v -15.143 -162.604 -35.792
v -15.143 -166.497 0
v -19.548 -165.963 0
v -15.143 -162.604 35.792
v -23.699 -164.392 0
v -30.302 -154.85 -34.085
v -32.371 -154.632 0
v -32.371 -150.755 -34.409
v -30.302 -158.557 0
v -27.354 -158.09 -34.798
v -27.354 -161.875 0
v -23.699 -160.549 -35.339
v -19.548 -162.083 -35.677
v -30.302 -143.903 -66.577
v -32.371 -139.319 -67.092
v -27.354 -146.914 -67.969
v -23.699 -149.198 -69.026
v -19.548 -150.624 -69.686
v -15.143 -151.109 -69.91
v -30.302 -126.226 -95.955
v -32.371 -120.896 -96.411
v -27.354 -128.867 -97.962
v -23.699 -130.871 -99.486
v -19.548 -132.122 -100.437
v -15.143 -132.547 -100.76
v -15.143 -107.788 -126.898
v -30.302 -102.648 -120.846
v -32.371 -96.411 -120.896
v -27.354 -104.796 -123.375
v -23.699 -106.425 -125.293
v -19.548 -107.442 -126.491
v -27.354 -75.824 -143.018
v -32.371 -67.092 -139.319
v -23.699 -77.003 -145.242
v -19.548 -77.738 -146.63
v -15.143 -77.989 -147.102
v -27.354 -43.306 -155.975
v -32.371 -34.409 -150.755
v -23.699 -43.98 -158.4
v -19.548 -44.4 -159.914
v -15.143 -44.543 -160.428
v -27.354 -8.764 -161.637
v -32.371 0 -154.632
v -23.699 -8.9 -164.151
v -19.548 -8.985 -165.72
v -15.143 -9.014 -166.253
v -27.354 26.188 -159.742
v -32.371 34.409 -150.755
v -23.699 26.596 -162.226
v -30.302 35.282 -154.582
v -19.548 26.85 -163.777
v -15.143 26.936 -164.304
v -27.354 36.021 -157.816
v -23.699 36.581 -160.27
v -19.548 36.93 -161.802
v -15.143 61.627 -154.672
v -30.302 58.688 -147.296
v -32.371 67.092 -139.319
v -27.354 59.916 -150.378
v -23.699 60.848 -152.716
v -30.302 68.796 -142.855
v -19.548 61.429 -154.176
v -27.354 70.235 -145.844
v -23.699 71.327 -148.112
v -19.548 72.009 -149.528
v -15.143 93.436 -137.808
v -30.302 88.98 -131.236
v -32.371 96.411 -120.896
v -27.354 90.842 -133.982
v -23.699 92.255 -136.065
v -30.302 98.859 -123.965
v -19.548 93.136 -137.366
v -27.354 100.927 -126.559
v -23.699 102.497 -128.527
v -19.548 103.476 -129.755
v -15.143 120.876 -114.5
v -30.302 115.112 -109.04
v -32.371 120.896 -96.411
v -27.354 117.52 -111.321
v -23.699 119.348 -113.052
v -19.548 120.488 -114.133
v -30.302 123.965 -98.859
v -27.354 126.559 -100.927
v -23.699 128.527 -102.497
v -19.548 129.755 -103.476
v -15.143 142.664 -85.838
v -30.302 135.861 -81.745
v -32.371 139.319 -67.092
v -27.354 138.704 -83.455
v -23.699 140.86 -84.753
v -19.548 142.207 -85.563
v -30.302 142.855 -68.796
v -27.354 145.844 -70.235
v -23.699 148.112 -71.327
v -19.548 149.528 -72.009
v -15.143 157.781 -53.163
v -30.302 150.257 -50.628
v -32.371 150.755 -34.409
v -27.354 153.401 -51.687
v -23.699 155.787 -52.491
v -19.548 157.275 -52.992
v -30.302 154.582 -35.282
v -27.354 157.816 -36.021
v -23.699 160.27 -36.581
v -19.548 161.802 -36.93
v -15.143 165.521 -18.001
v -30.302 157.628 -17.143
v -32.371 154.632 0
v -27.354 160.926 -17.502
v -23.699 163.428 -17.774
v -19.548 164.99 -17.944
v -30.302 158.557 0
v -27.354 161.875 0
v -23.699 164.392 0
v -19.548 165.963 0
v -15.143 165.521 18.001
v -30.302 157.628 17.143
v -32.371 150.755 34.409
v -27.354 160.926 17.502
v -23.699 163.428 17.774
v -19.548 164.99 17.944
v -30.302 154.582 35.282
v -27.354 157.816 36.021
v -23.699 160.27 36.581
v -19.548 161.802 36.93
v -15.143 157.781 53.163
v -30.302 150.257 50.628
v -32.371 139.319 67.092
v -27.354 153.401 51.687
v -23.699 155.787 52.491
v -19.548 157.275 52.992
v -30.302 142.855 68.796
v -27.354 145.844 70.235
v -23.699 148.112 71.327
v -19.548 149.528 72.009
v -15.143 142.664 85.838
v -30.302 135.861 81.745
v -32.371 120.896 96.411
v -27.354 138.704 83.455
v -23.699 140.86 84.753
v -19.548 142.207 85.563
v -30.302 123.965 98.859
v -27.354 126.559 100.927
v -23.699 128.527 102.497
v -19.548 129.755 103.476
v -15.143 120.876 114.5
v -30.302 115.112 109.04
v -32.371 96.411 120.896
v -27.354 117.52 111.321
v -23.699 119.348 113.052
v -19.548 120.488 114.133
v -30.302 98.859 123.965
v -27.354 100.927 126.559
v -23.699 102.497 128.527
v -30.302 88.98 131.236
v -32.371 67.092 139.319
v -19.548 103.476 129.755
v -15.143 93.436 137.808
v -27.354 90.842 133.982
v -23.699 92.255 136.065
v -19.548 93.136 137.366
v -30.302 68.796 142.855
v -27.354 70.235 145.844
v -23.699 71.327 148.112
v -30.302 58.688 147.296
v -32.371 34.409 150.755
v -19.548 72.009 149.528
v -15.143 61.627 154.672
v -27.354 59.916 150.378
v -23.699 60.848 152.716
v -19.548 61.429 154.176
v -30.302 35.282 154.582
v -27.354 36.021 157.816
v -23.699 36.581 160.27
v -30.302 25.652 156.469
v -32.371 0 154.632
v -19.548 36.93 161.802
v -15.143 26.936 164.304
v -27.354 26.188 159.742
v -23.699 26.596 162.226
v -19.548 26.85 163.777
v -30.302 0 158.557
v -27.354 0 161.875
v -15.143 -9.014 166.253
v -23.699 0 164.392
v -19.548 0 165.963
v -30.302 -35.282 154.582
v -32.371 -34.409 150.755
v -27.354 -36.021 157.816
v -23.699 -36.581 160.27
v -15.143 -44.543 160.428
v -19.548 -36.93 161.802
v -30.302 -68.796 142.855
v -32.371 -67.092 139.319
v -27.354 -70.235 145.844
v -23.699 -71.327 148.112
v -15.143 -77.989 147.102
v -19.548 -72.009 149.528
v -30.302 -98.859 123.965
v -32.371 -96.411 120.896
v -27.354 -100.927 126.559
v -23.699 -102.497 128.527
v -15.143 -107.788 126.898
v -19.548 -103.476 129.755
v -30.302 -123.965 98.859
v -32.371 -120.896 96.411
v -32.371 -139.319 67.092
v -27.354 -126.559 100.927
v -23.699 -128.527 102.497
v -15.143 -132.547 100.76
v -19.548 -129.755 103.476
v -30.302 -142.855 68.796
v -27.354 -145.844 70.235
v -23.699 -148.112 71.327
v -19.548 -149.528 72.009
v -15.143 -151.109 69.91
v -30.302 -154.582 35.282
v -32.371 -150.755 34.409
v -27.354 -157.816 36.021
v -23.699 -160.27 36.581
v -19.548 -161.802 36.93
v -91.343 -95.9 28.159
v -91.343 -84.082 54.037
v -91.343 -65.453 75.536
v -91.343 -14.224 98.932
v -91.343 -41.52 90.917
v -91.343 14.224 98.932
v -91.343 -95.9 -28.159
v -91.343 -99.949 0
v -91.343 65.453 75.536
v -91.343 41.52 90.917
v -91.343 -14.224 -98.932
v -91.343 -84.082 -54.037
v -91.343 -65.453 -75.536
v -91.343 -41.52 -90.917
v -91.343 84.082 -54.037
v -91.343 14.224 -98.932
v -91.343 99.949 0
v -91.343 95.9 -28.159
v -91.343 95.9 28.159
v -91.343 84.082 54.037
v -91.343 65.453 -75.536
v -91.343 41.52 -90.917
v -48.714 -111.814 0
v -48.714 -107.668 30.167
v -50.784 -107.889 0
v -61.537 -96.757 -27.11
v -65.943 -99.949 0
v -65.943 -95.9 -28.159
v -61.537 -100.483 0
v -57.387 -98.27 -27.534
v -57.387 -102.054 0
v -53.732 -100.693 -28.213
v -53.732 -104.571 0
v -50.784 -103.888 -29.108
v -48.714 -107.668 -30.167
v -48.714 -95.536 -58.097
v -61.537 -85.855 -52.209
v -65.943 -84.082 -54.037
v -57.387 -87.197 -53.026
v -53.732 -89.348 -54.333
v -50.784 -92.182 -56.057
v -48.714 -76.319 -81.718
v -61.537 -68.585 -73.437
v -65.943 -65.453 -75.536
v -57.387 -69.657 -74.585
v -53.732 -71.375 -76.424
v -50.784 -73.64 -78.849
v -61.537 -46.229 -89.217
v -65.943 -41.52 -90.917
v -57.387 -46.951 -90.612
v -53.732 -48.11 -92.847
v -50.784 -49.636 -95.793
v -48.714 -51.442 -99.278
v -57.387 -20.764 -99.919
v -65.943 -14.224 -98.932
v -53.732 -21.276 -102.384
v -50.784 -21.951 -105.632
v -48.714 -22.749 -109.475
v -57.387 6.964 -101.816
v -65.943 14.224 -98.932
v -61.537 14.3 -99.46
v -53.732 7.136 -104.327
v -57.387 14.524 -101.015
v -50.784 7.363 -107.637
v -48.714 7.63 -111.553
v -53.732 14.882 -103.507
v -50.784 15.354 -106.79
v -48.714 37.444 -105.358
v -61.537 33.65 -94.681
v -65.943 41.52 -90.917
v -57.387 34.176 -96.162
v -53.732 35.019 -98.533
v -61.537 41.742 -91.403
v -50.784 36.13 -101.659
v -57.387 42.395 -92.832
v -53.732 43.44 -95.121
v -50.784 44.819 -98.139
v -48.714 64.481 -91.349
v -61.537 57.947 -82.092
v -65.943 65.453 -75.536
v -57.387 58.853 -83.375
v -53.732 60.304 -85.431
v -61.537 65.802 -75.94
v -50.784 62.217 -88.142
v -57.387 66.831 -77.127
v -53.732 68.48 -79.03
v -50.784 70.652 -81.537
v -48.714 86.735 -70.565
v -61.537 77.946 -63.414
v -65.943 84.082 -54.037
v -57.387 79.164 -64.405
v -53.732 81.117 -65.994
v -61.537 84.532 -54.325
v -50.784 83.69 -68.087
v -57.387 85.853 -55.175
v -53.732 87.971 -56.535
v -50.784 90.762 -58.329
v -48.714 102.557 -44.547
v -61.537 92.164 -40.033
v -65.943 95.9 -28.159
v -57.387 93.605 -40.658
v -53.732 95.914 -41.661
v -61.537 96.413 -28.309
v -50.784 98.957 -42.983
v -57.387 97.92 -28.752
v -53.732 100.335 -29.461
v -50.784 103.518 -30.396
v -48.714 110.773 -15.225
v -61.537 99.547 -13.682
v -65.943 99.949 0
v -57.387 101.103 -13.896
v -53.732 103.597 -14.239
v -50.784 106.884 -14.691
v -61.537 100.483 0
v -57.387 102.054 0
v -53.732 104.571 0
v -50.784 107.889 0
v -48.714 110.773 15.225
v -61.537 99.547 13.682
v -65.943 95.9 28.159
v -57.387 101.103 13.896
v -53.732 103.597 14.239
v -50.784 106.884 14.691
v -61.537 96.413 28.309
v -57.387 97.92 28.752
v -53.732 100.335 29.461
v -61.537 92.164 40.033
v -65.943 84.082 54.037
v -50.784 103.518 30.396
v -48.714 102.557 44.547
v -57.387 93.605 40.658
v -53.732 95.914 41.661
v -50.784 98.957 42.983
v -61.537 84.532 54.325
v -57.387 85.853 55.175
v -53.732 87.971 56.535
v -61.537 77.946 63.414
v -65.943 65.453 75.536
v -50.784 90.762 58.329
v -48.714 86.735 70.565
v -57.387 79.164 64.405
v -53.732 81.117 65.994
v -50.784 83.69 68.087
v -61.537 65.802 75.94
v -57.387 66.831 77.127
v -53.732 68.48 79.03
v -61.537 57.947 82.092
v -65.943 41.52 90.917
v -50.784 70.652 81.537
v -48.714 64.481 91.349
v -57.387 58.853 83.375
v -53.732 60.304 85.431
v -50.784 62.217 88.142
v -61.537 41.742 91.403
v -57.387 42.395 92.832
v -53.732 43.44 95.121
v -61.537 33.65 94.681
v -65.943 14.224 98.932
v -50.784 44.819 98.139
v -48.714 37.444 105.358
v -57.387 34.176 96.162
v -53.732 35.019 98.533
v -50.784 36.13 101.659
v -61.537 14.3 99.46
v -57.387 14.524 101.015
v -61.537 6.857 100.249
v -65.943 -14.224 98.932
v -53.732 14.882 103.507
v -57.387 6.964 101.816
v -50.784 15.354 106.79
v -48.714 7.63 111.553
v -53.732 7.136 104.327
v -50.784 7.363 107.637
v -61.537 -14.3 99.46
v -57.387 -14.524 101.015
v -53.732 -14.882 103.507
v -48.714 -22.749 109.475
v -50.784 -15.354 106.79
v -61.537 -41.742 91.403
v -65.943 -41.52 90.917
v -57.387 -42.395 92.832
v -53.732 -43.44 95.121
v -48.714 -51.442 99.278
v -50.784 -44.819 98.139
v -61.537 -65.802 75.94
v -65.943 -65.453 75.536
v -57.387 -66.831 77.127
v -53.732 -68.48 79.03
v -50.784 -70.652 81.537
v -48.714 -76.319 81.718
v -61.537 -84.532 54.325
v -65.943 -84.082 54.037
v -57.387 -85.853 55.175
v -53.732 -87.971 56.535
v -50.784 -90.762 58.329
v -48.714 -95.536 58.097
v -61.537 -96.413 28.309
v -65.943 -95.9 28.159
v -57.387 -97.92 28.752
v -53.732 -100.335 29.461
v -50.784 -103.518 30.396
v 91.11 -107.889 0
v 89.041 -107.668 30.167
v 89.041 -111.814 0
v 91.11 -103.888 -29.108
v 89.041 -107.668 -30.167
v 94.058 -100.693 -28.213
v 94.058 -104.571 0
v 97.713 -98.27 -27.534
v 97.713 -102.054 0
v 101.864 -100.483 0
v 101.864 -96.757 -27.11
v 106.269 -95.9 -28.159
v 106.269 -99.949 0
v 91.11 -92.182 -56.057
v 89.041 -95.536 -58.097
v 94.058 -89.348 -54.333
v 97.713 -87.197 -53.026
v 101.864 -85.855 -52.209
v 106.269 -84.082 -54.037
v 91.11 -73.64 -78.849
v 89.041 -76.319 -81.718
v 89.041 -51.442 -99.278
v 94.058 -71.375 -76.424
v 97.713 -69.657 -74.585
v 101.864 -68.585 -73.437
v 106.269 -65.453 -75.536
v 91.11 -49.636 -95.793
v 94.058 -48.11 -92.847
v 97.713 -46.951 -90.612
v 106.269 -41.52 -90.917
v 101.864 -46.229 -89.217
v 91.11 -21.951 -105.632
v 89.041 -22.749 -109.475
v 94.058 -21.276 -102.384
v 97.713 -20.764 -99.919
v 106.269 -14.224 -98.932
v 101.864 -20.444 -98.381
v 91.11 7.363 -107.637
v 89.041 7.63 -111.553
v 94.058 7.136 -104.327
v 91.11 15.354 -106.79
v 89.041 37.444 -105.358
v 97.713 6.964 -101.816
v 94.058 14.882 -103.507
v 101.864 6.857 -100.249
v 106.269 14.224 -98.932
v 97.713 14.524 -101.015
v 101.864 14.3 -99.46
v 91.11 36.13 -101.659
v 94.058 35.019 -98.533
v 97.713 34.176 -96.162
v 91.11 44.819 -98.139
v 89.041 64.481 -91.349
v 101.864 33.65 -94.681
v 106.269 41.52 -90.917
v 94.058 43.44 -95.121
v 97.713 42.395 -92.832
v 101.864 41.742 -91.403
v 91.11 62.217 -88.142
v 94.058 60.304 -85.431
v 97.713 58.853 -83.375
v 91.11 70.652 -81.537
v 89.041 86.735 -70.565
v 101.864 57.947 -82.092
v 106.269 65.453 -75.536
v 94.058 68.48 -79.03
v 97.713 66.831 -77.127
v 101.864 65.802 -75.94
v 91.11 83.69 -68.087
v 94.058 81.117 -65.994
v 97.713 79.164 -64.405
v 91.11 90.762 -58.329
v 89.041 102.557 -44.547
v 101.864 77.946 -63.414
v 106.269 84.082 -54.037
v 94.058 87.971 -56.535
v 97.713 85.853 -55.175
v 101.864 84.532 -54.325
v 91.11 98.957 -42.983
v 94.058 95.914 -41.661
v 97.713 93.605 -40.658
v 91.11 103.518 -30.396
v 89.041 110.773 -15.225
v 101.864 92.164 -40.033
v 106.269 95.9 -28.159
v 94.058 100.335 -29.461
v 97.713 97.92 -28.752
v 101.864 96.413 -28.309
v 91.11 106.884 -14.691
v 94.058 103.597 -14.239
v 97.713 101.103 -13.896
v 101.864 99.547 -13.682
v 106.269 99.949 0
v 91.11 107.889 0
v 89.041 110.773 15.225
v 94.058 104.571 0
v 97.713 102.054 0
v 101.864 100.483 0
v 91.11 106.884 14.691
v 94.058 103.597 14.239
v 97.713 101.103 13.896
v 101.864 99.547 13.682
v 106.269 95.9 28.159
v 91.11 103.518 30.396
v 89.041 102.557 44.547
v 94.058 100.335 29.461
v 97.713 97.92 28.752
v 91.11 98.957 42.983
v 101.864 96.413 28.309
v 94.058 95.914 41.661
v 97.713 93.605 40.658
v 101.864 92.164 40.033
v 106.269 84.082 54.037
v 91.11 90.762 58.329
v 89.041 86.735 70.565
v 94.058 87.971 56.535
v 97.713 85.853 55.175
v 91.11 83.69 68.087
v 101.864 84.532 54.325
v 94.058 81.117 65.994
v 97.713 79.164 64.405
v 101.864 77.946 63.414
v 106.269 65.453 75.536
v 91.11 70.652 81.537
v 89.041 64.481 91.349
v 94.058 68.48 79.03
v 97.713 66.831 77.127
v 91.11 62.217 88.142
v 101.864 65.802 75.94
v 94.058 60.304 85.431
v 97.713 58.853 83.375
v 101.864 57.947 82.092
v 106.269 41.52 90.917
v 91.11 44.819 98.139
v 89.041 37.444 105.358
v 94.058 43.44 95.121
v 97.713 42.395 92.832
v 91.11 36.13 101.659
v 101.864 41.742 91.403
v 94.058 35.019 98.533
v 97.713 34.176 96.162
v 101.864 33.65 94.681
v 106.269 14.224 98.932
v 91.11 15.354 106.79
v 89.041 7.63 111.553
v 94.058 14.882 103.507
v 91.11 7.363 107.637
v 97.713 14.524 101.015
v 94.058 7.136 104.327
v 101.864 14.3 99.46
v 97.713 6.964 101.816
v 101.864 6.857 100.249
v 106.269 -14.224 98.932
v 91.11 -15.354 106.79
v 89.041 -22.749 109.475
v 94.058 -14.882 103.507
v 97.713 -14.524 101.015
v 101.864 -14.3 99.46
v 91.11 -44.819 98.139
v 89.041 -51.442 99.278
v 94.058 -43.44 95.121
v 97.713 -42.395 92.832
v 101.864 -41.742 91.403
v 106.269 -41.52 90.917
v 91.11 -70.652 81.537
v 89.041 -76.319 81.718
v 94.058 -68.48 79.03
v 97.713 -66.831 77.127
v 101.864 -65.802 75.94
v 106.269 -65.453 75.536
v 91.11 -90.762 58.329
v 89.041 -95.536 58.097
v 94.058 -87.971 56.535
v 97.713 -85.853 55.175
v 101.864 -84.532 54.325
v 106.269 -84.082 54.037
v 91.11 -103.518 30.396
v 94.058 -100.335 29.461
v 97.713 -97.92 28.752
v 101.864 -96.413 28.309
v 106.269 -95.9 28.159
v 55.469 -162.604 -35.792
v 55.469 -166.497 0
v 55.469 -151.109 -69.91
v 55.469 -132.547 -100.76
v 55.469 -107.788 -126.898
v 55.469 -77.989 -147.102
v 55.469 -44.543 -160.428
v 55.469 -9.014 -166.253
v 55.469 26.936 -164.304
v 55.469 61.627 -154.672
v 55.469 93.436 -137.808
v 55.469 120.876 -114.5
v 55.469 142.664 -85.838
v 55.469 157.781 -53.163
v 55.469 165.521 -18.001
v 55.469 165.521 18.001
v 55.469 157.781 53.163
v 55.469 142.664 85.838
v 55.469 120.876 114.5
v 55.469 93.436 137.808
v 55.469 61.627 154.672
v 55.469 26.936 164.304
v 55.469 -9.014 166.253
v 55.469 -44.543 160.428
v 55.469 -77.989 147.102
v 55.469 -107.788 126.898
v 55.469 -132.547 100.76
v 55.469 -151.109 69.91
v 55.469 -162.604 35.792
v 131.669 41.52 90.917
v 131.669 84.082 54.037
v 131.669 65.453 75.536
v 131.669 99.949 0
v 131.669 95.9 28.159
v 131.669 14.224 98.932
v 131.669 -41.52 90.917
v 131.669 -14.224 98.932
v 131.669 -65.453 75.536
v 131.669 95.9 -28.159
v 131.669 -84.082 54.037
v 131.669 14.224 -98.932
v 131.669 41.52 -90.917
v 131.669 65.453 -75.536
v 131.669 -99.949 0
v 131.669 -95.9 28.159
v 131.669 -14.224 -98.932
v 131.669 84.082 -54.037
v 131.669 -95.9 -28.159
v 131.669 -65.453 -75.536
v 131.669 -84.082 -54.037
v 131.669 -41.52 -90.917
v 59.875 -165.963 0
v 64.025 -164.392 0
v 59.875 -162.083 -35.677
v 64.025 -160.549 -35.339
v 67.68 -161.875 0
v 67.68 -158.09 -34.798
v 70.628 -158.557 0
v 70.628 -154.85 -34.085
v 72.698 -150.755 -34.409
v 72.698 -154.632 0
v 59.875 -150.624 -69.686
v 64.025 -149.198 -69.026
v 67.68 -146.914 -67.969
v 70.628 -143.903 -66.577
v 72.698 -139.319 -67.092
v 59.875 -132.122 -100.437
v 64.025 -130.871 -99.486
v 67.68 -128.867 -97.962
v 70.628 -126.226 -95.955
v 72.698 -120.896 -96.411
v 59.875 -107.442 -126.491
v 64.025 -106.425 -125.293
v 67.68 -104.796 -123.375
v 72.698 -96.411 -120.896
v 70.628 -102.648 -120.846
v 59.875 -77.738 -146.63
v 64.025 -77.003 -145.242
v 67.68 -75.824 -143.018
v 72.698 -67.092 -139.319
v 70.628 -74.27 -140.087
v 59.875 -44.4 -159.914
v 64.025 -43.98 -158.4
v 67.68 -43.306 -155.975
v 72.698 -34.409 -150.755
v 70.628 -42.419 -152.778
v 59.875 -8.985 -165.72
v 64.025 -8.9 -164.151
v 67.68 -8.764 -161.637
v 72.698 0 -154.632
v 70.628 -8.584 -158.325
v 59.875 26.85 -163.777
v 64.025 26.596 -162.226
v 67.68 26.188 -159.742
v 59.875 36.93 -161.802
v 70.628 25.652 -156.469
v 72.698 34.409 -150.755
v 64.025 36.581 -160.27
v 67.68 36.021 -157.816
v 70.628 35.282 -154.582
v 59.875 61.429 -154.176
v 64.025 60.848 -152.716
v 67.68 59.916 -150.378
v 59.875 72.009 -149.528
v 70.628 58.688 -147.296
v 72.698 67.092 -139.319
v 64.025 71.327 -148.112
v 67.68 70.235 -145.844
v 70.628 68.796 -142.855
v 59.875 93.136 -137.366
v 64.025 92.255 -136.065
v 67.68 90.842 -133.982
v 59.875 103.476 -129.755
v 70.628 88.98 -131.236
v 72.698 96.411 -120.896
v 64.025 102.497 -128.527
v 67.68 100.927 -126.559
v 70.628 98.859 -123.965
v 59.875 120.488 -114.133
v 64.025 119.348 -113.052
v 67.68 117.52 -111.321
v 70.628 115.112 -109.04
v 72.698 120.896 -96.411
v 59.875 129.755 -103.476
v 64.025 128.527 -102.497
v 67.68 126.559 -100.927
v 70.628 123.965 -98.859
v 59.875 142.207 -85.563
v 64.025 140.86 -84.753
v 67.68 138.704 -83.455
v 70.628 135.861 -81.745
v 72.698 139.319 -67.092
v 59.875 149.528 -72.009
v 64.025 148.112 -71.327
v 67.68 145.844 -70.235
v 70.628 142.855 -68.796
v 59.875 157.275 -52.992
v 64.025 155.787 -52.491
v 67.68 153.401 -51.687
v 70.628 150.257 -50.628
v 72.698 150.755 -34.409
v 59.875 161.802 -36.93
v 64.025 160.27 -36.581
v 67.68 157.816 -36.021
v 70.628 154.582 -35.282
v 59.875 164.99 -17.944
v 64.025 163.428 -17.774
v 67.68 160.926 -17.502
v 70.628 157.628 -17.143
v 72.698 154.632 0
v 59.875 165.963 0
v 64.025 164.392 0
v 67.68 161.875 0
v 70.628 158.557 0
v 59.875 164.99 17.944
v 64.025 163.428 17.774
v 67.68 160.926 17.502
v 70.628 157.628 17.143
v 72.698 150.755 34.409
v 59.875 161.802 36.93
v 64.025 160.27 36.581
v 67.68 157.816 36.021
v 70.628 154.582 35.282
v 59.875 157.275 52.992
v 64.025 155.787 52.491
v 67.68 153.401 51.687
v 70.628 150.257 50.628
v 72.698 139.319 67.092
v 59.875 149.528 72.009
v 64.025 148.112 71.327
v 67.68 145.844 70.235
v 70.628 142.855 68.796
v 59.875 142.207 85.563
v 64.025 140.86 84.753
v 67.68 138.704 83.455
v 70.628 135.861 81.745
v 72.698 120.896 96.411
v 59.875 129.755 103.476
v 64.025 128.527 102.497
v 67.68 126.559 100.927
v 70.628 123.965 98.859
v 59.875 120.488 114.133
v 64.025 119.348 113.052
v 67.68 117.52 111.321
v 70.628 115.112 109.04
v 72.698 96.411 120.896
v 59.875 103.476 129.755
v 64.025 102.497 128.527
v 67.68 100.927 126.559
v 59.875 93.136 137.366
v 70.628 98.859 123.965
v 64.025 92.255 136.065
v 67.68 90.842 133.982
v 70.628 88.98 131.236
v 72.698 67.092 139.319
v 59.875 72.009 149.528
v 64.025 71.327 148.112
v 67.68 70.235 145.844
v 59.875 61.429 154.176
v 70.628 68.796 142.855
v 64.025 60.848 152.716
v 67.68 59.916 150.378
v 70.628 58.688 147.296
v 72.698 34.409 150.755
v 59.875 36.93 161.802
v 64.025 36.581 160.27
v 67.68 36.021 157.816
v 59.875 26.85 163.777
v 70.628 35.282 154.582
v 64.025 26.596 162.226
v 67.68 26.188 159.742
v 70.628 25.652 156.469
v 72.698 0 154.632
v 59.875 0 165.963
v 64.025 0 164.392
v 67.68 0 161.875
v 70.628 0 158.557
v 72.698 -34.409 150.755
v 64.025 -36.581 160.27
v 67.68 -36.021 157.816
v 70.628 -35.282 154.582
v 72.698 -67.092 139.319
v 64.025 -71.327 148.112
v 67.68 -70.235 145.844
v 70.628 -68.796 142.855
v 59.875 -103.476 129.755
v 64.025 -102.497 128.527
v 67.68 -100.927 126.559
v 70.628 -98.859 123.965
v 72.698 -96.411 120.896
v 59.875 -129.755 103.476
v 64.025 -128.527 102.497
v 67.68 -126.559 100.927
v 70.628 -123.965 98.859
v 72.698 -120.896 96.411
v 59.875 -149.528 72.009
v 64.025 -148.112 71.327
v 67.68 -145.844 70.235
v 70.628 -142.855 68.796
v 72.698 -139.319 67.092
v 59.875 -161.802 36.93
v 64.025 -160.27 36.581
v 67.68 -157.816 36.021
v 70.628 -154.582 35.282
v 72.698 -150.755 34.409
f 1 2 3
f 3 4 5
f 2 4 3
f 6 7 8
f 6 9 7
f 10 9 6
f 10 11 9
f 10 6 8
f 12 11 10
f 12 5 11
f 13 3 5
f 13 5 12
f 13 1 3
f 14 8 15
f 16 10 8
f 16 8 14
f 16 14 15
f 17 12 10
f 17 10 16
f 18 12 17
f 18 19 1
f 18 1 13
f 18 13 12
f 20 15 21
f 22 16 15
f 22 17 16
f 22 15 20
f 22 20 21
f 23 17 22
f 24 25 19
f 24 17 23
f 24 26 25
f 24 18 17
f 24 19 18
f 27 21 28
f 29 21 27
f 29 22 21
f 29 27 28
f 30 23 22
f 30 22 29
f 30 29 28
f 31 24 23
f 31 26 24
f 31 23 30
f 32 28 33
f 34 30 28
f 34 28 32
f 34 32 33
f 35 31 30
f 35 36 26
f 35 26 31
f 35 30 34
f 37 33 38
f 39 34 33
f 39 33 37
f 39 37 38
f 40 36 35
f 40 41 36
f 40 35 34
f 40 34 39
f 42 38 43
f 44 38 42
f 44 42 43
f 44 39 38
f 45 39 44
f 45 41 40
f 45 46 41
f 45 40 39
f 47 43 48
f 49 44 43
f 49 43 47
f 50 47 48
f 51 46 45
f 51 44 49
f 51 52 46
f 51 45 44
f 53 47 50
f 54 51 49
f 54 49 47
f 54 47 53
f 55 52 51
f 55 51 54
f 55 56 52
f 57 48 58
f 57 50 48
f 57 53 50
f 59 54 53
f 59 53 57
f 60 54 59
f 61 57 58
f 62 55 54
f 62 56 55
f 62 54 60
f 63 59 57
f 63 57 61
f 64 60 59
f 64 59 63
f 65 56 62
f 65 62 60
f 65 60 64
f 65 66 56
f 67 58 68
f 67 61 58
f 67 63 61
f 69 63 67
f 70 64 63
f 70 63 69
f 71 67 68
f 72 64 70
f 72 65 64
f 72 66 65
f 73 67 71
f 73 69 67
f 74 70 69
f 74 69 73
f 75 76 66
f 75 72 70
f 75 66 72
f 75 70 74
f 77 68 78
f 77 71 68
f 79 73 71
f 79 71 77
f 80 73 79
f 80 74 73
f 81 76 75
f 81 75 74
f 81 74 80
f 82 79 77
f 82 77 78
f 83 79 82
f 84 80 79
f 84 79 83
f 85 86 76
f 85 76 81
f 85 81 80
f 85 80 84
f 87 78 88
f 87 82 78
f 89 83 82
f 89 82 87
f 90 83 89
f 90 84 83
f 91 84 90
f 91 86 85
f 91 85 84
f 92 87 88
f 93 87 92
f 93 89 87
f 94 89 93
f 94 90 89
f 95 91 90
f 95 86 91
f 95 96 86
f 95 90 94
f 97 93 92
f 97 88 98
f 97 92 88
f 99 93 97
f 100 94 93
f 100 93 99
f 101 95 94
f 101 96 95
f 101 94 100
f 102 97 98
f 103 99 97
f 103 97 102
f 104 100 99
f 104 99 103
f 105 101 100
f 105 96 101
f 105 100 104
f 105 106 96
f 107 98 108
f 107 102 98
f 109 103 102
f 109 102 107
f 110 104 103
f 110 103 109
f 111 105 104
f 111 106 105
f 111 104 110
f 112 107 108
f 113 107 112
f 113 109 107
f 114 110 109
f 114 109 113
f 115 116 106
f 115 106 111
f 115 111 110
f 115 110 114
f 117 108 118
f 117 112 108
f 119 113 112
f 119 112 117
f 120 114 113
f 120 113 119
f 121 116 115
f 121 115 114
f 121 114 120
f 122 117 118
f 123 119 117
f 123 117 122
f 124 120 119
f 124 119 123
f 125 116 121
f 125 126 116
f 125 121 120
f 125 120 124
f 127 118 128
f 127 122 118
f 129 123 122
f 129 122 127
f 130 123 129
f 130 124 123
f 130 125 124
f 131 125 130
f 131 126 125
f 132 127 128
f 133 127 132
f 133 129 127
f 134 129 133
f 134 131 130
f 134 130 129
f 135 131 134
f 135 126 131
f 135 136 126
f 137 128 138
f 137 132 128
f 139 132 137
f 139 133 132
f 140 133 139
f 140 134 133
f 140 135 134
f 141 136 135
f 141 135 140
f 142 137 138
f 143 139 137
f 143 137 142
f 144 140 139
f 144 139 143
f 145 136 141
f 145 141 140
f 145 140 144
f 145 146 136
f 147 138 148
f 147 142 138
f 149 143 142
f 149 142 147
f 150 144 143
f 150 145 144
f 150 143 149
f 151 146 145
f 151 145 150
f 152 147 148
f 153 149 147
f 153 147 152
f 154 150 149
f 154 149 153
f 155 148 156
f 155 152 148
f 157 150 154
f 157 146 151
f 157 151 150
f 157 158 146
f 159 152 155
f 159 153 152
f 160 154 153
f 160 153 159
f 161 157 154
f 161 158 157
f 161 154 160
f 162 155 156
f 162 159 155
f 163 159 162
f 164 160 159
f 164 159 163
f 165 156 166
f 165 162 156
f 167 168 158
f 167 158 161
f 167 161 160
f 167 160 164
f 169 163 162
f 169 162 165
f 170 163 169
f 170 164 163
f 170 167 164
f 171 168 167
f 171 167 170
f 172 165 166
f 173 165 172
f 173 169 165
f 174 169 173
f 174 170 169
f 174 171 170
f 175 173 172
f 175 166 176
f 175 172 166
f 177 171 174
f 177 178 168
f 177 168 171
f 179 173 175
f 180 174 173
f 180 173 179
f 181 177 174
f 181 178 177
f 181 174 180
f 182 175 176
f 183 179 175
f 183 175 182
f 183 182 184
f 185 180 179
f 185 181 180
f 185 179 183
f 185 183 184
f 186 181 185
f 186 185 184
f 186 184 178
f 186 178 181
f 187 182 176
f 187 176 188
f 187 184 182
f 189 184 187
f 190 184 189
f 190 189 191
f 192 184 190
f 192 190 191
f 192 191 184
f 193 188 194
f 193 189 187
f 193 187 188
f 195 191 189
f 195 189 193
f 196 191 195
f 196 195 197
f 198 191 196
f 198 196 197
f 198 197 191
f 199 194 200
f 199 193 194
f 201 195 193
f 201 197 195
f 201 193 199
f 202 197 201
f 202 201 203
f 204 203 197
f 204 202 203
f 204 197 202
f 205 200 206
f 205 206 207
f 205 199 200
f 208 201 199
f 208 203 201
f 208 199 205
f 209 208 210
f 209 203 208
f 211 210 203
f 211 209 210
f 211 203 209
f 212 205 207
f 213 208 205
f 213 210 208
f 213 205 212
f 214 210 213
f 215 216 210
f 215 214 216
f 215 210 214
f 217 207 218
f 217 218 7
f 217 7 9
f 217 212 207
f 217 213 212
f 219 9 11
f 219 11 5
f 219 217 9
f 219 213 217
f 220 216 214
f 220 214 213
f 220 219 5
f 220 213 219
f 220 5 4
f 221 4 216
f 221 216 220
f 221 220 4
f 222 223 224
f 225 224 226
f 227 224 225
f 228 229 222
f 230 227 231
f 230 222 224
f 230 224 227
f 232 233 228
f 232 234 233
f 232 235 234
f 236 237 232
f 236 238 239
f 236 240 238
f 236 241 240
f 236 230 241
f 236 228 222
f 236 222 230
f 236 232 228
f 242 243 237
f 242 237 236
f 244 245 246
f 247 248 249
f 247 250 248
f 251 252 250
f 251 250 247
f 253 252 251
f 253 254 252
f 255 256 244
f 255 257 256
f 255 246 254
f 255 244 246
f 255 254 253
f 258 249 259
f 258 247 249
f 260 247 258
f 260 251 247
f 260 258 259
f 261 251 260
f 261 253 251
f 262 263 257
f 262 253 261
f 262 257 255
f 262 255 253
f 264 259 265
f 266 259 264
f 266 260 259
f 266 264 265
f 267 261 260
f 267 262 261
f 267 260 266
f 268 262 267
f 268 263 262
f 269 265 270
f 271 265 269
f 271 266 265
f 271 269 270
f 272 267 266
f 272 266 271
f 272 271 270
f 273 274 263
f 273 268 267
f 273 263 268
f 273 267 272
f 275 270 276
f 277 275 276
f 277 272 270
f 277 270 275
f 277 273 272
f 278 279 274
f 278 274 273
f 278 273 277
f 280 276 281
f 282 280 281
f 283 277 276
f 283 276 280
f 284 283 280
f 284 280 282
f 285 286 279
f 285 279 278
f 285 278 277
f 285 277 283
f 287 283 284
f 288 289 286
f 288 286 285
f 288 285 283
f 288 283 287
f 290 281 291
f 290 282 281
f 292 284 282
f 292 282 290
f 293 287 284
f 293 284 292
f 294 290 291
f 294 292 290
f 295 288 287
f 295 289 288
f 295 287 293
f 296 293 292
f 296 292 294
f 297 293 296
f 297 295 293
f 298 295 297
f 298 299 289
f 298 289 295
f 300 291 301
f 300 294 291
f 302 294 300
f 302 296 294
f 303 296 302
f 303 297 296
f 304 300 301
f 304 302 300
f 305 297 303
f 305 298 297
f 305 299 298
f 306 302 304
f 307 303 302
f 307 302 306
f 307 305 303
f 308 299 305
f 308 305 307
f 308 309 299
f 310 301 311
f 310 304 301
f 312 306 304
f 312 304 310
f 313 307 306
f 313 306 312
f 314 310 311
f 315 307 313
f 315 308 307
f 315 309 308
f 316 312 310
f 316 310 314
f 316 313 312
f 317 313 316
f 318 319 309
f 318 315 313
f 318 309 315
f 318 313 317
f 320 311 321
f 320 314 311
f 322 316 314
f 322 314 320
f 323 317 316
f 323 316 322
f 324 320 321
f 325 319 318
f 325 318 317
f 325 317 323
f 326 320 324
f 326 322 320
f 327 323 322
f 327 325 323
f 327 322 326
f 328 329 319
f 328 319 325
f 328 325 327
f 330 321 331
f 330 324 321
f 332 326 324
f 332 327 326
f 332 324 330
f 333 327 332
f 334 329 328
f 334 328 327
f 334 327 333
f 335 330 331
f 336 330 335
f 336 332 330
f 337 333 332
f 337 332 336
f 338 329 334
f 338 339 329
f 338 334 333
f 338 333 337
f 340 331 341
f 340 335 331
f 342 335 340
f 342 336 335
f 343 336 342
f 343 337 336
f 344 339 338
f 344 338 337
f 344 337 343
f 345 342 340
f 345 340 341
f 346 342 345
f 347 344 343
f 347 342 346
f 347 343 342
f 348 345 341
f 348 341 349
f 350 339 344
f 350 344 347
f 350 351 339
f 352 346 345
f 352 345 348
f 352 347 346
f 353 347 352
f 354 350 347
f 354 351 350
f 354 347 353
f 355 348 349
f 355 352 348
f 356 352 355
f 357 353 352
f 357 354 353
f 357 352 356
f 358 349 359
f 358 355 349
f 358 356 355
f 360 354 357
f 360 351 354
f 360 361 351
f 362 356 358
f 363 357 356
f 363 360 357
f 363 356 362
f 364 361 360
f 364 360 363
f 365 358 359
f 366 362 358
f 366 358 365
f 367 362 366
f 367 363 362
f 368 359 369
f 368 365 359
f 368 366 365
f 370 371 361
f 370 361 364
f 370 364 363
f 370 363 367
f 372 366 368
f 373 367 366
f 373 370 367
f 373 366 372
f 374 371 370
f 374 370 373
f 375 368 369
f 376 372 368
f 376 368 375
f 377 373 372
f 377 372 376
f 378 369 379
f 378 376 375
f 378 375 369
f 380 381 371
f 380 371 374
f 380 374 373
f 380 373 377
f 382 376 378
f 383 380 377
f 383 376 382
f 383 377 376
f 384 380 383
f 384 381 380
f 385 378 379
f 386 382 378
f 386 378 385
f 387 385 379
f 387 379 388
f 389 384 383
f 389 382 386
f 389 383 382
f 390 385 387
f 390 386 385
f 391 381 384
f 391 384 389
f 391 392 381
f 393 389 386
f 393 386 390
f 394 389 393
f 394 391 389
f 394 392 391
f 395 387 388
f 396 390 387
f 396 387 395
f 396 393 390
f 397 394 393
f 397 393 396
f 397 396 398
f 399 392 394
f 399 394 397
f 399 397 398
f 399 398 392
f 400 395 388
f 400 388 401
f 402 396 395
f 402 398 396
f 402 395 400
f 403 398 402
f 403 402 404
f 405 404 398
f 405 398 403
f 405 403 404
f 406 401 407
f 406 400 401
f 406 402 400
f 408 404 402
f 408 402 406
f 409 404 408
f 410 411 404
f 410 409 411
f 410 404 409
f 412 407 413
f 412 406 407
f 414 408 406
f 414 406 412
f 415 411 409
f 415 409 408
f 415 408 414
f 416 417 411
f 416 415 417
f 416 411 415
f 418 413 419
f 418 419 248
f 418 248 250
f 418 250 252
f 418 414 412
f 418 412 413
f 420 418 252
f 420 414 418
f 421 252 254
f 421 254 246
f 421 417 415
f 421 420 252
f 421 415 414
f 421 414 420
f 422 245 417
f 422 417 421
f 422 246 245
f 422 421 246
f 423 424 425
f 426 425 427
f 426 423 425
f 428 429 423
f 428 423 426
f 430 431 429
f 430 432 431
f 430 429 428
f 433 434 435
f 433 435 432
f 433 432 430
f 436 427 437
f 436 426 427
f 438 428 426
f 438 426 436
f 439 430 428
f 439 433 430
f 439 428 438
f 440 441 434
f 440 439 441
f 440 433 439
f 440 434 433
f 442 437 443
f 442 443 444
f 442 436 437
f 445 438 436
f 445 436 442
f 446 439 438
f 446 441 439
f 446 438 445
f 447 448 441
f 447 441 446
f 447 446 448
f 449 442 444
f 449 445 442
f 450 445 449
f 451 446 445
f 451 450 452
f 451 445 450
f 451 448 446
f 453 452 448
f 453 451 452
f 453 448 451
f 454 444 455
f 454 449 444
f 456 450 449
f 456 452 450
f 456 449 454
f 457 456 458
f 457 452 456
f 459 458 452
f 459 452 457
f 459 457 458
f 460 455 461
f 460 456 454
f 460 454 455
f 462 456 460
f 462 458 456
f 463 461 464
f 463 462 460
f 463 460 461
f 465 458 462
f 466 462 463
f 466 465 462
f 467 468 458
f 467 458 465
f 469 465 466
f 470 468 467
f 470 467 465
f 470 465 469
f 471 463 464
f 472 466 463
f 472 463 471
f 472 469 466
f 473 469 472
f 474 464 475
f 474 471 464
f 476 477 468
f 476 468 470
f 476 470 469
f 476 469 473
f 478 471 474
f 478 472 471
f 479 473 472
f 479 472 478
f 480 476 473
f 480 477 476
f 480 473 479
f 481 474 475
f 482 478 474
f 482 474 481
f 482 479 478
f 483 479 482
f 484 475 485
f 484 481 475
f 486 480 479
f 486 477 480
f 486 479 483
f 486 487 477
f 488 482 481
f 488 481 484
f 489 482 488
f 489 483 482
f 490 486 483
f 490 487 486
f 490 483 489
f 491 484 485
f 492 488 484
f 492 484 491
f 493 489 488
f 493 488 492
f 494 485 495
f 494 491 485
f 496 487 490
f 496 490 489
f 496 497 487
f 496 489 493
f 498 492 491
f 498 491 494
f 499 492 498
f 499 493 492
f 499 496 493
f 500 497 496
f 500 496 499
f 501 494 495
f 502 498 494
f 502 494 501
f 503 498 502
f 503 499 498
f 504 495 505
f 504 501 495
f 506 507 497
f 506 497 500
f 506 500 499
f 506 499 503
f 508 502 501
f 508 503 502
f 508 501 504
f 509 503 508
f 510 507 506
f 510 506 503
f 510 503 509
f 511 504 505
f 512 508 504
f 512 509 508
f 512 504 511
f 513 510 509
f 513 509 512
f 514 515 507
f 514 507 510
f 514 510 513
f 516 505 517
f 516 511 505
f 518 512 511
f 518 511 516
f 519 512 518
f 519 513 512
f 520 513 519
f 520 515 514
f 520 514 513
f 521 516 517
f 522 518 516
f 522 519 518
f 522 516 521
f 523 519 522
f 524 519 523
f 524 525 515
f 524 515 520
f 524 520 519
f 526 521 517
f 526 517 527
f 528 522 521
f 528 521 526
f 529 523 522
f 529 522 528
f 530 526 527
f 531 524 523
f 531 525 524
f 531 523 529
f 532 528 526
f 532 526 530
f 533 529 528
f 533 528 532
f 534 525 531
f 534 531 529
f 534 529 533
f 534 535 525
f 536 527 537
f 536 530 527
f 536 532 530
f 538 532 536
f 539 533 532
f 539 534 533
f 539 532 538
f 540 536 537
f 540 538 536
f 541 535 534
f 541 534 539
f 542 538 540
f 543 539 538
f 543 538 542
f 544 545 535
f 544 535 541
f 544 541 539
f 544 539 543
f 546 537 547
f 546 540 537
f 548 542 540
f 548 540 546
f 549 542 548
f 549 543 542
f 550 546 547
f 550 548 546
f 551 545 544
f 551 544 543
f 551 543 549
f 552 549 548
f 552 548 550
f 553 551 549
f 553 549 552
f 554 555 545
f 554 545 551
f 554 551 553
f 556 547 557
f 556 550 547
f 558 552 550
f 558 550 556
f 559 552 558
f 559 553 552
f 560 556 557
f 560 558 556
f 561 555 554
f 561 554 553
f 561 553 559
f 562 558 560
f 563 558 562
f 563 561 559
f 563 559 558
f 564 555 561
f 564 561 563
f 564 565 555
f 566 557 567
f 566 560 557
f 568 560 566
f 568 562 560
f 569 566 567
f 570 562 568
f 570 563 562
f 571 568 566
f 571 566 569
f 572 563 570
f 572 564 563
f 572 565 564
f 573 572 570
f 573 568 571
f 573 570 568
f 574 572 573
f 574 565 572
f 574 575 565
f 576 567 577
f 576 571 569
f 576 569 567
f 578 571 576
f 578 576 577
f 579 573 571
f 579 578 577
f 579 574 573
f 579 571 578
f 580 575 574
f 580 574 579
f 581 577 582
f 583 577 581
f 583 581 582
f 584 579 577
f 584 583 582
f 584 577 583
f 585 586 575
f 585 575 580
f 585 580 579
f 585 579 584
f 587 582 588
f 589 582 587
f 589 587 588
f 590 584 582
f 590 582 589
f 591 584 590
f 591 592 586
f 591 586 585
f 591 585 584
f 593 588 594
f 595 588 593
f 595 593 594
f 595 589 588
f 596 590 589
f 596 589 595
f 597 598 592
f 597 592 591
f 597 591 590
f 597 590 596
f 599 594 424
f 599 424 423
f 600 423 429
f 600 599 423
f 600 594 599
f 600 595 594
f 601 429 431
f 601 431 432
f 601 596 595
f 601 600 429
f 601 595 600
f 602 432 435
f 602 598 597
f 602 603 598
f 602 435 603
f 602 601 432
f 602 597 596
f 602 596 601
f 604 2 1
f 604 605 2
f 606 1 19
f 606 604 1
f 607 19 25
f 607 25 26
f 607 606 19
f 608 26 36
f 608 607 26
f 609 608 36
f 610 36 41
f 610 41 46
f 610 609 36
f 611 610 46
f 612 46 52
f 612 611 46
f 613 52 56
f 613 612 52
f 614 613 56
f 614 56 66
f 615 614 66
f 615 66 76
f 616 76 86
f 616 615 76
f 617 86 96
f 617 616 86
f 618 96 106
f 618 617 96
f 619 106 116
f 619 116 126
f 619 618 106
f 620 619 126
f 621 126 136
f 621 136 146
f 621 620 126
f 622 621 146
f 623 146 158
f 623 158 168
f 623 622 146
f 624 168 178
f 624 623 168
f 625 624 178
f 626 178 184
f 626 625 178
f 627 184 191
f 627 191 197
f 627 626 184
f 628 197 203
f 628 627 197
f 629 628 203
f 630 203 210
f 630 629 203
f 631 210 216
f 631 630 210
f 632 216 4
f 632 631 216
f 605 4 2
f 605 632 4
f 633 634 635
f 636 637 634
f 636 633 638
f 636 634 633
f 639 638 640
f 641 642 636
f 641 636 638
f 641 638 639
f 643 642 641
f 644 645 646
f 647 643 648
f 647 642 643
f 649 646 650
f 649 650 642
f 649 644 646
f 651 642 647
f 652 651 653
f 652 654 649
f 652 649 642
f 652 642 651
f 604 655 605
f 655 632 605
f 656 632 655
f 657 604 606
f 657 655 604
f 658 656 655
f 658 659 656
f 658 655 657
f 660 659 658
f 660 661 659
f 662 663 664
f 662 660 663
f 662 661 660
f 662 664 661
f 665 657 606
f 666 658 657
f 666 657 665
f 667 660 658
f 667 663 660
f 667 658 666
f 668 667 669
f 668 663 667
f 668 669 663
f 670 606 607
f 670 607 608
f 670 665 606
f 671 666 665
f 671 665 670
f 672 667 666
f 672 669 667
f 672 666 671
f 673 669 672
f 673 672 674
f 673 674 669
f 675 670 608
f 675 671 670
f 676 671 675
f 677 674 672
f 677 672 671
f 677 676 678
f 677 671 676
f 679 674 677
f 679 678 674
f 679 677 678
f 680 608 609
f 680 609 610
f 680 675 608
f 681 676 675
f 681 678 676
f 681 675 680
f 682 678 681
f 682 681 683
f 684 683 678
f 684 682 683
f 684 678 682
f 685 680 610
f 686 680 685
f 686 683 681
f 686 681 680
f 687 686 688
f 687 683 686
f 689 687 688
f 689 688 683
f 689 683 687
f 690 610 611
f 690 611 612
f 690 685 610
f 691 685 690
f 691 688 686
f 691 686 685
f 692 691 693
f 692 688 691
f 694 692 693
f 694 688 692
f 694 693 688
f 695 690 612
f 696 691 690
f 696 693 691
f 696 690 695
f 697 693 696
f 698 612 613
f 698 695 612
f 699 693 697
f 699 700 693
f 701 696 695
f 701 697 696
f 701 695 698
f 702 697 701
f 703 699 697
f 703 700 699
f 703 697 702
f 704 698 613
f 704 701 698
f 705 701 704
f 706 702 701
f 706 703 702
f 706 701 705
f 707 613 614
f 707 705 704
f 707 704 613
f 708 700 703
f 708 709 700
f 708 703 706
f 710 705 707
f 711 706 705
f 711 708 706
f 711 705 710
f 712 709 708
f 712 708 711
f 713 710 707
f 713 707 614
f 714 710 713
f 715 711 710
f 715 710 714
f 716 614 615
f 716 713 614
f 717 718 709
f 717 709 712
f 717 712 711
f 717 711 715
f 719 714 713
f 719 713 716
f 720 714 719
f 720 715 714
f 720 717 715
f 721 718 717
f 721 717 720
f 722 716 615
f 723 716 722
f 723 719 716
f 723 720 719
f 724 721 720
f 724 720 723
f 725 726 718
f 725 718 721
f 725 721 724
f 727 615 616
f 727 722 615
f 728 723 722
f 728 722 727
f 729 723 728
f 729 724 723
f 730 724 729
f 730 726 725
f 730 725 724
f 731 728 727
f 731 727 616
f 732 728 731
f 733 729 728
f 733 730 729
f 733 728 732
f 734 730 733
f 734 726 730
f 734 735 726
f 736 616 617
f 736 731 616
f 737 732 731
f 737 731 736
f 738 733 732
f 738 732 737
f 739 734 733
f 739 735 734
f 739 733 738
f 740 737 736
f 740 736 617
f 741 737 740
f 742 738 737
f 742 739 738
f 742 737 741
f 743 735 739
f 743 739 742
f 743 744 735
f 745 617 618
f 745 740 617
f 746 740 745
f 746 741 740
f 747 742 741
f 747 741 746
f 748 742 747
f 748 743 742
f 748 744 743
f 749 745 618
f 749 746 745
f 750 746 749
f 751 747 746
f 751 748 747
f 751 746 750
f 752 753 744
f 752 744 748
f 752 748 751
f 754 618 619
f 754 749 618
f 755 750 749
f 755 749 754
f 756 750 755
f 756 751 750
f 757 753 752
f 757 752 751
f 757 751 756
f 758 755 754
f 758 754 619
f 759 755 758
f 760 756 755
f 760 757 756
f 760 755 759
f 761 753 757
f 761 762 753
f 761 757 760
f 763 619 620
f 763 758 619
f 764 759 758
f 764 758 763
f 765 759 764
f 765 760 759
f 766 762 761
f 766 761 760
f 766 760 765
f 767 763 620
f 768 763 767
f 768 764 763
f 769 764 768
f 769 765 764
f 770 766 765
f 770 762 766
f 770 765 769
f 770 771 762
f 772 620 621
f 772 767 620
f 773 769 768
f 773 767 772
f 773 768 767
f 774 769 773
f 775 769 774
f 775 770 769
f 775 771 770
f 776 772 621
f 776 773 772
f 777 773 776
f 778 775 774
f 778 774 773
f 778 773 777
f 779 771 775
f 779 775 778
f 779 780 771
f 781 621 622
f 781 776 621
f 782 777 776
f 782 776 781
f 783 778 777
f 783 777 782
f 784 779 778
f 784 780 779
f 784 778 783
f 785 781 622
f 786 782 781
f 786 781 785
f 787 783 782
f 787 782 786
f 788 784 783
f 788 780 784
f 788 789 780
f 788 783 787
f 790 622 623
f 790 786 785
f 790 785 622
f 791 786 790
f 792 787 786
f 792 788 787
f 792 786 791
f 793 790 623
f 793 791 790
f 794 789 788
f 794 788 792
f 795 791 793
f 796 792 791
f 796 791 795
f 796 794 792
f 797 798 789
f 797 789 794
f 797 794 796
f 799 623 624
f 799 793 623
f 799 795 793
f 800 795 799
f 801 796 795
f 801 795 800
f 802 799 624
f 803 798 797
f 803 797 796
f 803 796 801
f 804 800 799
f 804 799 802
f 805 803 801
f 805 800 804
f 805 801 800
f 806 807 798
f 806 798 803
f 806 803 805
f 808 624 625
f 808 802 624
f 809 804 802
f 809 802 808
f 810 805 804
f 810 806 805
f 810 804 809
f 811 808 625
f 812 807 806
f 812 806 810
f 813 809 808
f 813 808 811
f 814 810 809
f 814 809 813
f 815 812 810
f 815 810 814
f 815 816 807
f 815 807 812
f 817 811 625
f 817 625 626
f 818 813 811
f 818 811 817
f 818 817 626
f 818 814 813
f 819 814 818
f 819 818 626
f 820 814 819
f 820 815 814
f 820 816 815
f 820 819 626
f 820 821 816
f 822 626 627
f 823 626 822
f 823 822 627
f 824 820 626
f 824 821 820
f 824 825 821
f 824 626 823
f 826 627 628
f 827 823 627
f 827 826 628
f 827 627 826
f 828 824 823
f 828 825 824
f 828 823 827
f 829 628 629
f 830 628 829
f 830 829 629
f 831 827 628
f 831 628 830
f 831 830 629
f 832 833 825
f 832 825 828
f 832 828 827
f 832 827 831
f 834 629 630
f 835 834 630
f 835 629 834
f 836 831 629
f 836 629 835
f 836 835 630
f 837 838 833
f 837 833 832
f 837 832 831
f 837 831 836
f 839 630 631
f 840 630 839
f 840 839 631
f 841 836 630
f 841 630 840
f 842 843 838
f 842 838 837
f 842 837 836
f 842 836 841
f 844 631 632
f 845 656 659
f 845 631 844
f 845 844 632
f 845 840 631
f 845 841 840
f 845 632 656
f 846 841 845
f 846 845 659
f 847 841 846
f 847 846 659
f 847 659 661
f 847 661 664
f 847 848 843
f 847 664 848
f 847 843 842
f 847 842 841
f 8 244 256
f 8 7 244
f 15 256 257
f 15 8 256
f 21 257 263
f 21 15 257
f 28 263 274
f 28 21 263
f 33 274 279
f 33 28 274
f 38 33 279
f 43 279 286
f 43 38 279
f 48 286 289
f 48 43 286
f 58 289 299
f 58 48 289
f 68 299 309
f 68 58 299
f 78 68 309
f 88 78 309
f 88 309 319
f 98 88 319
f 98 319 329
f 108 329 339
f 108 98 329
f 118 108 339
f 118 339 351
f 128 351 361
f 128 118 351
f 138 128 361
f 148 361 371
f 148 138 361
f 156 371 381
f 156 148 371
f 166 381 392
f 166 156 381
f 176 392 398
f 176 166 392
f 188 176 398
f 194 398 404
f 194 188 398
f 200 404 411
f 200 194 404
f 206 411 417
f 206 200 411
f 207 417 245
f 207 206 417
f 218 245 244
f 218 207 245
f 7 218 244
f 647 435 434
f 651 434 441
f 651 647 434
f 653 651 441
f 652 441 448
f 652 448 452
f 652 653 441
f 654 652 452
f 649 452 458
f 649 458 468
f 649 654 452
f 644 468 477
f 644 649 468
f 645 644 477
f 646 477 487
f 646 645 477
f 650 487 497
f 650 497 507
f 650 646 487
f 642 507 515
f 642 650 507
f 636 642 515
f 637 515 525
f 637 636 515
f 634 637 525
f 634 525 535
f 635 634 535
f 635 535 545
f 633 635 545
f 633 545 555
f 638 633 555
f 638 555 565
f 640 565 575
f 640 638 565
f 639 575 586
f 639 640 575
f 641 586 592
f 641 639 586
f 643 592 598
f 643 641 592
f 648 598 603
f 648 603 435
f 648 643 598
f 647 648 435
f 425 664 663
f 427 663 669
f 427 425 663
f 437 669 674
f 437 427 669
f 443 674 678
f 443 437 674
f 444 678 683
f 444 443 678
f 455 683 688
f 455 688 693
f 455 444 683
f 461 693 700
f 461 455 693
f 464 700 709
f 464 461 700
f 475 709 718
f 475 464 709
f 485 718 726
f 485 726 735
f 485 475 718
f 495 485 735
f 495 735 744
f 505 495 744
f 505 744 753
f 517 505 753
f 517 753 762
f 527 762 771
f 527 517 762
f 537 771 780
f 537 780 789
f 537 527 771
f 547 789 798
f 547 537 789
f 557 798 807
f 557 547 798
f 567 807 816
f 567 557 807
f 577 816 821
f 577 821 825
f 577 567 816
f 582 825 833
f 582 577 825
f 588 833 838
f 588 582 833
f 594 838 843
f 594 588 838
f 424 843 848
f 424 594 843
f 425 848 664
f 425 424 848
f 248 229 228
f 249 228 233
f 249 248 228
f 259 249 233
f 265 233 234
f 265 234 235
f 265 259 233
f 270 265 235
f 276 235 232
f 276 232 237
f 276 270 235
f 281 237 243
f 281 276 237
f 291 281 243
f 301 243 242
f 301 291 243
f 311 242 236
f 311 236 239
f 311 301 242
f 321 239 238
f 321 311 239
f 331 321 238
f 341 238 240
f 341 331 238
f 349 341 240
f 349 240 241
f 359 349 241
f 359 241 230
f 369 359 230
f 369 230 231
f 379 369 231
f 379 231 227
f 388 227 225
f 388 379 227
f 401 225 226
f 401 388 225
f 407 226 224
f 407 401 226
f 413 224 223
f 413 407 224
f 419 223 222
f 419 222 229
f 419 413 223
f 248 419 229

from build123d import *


with BuildPart() as f1:
    # F0 (on Top) → F1 (revolve)
    with BuildSketch(Plane.XY):
        with BuildLine():
            Line((131.669218, 0), (-91.342782, 0))
            Line((-91.342782, 0), (-91.342782, -99.949))
            Line((-91.342782, -99.949), (-65.942782, -99.949))
            ThreePointArc((-65.942782, -99.949), (-55.483238, -103.202239), (-48.714109, -111.814122))
            Line((-48.714109, -111.814122), (-32.371455, -154.631878))
            ThreePointArc((-32.371455, -154.631878), (-25.602327, -163.243761), (-15.142782, -166.497))
            Line((-15.142782, -166.497), (55.469218, -166.497))
            ThreePointArc((55.469218, -166.497), (65.928762, -163.243761), (72.697891, -154.631878))
            Line((72.697891, -154.631878), (89.040545, -111.814122))
            ThreePointArc((89.040545, -111.814122), (95.809673, -103.202239), (106.269218, -99.949))
            Line((106.269218, -99.949), (131.669218, -99.949))
            Line((131.669218, -99.949), (131.669218, 0))
        make_face()
    revolve(axis=Axis((20.163218, 0, 0), (1, 0, 0)))


solid = f1.part
